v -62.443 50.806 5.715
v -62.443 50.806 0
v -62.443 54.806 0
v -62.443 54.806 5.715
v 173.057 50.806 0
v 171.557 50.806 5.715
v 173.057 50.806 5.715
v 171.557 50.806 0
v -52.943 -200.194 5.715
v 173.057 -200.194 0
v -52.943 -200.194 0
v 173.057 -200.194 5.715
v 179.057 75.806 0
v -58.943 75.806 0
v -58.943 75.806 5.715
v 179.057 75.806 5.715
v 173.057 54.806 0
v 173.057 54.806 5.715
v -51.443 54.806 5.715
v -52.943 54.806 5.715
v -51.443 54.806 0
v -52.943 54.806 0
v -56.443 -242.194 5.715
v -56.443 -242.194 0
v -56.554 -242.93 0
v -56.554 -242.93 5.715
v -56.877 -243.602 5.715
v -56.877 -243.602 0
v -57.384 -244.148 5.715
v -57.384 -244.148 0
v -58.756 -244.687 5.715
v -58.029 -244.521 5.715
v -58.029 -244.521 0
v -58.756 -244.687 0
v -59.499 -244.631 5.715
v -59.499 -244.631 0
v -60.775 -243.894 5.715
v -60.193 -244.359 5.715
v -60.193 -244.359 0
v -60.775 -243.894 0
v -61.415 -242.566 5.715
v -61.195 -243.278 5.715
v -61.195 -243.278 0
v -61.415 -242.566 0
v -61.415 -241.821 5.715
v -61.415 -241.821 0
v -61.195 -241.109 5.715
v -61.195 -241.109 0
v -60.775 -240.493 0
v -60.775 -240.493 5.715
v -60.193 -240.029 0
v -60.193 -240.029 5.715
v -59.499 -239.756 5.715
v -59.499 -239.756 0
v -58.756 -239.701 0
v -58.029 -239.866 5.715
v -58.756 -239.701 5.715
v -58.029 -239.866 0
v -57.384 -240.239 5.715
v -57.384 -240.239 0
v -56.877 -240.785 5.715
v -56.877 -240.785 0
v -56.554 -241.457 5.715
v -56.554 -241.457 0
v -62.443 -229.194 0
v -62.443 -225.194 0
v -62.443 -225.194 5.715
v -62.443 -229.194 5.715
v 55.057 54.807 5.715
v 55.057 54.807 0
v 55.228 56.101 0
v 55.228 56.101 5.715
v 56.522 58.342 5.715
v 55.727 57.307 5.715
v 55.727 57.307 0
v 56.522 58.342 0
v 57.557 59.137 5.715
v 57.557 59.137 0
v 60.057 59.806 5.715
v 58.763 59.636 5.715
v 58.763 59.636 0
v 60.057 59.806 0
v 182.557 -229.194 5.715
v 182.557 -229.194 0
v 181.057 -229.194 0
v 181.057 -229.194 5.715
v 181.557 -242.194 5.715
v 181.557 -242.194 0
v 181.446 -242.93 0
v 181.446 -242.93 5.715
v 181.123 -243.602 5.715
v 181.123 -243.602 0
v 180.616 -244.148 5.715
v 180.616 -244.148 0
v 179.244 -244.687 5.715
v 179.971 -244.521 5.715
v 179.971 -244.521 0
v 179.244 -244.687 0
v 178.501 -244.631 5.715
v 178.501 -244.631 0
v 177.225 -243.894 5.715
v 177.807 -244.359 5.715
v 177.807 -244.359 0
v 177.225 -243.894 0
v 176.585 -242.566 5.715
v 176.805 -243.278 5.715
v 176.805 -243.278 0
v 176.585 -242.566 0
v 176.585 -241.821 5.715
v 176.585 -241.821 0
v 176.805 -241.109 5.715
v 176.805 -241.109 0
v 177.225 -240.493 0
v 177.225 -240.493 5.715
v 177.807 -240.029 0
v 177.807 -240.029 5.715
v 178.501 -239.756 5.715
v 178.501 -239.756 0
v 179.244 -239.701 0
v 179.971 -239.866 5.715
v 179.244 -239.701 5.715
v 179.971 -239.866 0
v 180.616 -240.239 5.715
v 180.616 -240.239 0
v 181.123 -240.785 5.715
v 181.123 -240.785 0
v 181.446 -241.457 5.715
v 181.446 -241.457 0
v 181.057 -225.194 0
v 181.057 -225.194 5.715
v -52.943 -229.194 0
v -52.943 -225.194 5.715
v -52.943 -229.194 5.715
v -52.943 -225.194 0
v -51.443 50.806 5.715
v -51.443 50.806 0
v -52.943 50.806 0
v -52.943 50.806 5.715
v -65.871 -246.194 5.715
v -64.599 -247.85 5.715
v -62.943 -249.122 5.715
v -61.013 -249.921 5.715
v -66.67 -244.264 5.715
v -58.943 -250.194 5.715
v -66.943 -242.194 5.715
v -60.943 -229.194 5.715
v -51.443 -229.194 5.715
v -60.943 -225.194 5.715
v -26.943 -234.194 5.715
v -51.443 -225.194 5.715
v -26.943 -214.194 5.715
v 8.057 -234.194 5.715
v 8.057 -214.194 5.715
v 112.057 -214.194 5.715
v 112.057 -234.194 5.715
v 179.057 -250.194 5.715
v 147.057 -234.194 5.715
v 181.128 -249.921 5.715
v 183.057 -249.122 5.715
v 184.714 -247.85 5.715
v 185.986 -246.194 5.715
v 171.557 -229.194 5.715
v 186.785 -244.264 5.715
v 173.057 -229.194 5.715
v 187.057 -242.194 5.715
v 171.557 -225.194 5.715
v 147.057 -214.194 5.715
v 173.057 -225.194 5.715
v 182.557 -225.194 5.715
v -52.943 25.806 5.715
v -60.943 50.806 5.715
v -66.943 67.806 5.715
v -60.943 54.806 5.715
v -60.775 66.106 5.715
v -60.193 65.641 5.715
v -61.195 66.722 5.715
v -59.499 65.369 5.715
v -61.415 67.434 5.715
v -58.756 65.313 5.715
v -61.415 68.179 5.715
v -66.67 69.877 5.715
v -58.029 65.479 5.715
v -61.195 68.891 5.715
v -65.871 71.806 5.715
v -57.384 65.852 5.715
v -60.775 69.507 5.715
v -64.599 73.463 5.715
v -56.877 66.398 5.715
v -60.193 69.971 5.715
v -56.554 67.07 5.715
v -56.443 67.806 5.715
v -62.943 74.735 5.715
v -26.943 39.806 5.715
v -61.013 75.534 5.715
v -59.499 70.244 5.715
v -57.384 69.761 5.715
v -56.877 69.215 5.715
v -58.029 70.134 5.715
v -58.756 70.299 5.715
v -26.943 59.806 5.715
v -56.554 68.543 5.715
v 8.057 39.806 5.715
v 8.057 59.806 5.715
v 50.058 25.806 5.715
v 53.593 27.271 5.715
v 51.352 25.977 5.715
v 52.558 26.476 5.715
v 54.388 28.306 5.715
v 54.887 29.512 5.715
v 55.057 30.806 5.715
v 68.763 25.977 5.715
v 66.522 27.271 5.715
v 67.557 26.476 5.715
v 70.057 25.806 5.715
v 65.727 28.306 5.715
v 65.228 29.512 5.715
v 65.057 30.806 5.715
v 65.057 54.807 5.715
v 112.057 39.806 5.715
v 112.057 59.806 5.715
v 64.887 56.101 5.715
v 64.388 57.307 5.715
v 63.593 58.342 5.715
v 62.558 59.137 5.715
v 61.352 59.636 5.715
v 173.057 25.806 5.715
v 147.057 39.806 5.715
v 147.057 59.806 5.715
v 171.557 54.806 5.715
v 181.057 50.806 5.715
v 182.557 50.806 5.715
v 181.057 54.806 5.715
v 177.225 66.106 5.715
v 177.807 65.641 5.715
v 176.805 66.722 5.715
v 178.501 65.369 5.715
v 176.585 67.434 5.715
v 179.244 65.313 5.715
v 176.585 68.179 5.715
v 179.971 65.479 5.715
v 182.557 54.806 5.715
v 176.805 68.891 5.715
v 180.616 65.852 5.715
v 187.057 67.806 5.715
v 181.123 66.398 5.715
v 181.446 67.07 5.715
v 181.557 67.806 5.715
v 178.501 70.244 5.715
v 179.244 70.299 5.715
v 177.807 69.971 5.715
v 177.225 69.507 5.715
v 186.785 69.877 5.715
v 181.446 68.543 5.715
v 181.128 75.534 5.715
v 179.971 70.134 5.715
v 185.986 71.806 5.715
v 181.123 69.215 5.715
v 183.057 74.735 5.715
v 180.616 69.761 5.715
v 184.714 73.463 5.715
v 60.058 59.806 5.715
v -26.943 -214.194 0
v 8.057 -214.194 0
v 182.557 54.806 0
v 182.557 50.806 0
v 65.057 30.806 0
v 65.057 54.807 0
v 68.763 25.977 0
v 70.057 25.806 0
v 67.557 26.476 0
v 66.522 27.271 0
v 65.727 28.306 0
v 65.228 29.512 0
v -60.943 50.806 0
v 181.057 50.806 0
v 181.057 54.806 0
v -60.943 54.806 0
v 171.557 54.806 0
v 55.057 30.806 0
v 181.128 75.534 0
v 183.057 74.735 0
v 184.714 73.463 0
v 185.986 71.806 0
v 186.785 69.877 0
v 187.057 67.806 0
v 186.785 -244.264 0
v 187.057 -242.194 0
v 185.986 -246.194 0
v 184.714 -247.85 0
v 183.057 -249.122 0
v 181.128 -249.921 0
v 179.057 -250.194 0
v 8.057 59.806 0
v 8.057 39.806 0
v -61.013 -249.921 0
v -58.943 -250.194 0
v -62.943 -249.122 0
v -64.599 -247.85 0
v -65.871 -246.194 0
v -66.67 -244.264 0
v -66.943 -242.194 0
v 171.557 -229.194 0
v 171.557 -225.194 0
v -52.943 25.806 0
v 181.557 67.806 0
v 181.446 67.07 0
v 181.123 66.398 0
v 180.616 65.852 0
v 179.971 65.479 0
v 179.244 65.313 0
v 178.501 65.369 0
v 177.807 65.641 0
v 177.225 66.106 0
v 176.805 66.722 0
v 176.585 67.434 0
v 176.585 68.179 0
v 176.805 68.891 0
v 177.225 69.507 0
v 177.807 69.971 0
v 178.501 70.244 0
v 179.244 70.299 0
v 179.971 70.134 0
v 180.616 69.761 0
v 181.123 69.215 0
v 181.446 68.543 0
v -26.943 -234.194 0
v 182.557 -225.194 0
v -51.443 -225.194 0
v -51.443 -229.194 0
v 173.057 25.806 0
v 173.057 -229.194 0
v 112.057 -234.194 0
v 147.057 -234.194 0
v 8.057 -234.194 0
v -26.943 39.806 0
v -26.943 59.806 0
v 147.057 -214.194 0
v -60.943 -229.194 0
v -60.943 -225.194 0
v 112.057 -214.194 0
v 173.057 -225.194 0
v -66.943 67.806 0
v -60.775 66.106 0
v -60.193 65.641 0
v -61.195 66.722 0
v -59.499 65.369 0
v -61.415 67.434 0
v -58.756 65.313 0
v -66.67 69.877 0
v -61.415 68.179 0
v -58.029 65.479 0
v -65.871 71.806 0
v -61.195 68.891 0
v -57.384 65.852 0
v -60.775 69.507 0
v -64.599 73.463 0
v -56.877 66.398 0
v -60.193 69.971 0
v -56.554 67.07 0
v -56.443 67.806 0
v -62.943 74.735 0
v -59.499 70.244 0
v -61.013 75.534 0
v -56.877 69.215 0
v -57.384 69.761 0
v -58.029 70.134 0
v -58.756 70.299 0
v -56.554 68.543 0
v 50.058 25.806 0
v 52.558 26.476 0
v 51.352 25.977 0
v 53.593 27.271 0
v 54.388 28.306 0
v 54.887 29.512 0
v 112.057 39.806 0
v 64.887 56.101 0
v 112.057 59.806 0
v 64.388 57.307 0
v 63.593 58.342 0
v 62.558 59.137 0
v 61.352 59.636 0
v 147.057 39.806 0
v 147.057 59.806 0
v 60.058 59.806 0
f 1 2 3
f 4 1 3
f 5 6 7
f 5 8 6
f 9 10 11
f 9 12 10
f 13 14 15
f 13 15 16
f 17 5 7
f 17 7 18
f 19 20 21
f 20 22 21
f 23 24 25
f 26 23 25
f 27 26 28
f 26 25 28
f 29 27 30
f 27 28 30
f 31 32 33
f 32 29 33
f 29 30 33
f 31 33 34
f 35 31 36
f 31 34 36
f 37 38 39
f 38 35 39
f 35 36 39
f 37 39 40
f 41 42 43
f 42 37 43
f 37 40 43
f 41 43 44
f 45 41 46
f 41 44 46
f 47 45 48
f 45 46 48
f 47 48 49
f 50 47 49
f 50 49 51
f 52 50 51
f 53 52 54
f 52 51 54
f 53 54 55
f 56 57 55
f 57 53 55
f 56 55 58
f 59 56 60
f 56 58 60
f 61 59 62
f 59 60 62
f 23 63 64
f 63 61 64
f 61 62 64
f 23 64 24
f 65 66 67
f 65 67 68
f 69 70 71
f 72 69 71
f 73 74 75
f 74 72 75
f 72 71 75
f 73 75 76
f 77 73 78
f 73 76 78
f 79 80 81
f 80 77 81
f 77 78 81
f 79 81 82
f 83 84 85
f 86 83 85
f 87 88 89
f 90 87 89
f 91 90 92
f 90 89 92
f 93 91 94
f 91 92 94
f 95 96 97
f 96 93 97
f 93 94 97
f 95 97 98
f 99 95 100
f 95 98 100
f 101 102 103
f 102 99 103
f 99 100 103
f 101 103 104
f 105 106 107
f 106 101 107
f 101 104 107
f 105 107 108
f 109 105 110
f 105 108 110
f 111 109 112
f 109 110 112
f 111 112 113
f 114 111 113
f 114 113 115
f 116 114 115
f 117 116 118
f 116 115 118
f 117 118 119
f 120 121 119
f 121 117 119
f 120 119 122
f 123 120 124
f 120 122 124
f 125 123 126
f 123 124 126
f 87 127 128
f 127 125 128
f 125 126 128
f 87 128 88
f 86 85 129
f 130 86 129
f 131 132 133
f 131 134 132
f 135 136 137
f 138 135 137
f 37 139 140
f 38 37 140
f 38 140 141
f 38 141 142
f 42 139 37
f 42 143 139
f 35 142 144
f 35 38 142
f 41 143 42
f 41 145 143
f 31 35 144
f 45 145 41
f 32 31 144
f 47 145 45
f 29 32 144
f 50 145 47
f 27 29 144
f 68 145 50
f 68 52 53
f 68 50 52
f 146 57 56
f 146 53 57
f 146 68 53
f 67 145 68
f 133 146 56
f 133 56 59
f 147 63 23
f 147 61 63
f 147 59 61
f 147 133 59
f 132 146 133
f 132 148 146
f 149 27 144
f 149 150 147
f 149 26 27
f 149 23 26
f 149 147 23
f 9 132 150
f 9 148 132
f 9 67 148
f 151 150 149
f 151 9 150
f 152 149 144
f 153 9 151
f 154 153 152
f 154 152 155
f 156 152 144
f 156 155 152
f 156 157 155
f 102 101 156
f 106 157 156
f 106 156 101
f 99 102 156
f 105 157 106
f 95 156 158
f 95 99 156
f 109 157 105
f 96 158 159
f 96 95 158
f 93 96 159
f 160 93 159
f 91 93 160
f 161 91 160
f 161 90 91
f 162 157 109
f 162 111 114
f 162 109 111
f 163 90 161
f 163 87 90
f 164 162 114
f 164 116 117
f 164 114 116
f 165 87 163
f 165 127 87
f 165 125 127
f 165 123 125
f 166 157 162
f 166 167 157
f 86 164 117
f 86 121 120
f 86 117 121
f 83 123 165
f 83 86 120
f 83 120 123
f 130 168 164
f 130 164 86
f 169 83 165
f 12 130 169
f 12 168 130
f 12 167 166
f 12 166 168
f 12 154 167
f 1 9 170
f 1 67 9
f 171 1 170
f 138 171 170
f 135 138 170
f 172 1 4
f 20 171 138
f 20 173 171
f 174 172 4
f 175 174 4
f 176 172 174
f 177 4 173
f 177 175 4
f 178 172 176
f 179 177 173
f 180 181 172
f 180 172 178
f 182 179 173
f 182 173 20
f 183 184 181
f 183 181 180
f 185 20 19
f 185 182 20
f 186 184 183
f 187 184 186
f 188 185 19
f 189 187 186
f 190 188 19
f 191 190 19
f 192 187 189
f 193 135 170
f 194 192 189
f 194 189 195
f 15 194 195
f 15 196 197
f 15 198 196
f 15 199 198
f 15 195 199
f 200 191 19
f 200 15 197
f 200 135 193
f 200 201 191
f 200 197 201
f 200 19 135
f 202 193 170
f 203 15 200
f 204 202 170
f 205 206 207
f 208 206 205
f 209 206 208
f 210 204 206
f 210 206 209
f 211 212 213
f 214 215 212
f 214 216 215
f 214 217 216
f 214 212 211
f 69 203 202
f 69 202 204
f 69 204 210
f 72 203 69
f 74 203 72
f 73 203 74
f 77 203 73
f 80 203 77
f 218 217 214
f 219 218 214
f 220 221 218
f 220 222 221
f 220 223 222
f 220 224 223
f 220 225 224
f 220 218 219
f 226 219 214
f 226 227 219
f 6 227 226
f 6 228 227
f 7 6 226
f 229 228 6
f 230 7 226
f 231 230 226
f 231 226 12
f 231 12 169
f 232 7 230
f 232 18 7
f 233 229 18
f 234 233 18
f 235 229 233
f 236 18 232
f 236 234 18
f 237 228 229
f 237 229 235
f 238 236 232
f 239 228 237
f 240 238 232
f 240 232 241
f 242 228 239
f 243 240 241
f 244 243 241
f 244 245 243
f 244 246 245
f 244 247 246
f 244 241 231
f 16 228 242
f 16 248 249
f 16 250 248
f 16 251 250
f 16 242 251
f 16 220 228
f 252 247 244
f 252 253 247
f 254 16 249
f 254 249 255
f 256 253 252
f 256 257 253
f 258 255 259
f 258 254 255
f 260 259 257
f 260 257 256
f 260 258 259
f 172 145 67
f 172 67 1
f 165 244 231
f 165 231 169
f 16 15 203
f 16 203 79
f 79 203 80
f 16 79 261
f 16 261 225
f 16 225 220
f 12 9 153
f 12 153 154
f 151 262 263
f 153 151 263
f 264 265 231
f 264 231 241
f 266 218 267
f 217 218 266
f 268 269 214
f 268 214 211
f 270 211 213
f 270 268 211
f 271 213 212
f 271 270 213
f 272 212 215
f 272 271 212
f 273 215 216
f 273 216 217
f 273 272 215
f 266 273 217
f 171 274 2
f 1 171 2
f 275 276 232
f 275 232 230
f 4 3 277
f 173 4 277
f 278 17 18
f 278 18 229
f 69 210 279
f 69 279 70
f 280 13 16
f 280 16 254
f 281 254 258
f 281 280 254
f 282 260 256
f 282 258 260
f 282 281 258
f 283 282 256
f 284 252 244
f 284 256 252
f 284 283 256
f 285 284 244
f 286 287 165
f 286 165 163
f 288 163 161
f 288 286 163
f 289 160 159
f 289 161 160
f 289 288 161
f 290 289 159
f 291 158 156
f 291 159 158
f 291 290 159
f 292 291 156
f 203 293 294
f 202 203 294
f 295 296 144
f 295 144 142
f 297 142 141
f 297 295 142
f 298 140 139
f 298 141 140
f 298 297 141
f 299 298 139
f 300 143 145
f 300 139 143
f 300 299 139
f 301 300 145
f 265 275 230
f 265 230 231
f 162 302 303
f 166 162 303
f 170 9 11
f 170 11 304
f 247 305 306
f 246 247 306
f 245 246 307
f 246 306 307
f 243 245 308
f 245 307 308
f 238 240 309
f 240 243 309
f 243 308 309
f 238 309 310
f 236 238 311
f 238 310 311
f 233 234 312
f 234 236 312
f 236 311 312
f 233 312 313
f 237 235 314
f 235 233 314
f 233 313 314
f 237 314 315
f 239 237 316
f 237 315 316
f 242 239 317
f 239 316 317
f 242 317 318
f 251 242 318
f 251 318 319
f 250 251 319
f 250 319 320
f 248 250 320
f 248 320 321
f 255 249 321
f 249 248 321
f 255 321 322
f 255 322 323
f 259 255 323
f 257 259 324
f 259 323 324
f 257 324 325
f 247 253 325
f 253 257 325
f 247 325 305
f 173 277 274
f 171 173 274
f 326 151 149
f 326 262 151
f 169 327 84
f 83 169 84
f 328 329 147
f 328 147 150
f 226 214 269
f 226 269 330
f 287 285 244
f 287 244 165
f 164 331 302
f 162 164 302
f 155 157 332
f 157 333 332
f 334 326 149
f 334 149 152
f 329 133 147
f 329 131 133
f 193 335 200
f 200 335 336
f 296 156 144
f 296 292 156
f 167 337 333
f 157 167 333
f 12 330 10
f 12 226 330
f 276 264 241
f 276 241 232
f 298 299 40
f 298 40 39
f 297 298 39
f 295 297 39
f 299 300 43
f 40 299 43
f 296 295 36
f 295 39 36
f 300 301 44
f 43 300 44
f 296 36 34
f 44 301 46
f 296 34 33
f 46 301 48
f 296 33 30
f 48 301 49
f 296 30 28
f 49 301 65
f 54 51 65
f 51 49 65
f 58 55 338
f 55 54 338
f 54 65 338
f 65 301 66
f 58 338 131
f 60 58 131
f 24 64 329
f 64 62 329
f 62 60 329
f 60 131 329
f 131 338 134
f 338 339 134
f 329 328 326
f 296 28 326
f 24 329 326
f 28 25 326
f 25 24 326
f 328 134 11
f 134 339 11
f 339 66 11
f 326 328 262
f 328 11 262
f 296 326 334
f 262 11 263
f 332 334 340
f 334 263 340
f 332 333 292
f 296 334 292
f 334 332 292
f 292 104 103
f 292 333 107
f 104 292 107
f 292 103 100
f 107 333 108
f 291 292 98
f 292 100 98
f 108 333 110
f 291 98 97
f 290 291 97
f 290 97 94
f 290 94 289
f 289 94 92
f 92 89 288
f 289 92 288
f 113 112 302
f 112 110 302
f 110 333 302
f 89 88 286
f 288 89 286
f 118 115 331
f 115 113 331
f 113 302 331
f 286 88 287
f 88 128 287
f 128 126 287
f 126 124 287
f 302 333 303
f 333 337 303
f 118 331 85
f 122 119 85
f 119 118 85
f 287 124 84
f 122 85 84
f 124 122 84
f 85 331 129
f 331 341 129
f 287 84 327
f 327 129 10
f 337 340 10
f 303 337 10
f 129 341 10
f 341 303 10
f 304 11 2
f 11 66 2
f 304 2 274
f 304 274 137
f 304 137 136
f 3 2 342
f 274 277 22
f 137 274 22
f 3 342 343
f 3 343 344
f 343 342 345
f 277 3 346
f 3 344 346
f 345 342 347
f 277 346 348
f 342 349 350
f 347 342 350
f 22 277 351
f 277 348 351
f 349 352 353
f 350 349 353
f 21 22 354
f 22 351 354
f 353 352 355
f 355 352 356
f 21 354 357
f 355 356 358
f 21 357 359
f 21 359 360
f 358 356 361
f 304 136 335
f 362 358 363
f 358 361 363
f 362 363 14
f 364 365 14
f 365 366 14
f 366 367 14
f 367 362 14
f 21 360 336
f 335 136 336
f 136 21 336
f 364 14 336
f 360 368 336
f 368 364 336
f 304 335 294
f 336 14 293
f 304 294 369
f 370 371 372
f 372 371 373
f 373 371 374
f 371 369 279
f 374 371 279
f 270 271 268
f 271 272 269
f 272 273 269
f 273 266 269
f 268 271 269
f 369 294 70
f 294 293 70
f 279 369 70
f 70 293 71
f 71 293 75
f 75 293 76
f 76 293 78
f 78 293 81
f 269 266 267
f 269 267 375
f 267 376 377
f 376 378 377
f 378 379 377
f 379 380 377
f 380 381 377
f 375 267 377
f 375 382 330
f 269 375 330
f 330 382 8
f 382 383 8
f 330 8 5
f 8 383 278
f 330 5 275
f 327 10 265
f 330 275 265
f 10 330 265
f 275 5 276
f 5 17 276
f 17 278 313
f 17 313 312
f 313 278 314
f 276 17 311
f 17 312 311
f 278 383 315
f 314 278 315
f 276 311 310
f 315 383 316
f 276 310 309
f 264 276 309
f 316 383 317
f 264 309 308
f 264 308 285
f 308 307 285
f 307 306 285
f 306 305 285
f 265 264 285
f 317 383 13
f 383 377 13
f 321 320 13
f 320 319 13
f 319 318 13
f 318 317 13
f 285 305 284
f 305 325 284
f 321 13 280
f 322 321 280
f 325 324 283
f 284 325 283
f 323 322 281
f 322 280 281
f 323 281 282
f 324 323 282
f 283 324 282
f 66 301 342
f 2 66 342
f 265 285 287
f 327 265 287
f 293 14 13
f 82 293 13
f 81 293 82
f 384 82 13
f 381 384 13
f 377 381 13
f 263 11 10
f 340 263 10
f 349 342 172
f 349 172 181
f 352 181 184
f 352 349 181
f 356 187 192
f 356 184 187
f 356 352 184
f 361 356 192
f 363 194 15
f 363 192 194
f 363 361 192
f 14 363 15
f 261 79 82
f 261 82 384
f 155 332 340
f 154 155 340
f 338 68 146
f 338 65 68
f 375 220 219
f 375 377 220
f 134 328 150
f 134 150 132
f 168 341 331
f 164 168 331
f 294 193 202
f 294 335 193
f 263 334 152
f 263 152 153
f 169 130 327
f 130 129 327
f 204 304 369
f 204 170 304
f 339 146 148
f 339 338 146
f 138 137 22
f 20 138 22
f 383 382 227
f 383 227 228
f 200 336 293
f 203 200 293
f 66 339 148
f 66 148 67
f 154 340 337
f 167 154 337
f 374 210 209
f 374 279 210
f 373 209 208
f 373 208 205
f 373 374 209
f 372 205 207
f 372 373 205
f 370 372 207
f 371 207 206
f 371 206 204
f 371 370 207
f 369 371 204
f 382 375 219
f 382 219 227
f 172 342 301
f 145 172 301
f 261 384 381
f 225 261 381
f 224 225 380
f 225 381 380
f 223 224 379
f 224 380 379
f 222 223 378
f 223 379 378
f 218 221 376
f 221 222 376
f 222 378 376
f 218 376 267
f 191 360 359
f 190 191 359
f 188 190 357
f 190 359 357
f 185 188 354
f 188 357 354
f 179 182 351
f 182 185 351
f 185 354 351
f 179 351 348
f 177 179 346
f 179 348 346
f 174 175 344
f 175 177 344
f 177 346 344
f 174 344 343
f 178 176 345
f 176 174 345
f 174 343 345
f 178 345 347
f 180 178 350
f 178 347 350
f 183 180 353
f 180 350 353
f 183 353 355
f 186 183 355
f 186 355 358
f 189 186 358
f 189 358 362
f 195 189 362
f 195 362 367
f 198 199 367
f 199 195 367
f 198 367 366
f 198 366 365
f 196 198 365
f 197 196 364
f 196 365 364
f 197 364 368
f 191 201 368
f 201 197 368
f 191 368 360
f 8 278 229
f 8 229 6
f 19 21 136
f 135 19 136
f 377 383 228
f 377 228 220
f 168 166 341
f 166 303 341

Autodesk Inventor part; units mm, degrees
ref_plane "YZ Plane" through (0, 0, 0) normal (1, 0, 0) x (0, 1, 0)
ref_plane "XZ Plane" through (0, 0, 0) normal (0, 1, 0) x (-1, 0, 0)
ref_plane "XY Plane" through (0, 0, 0) normal (0, 0, 1) x (1, 0, 0)
sketch "Sketch3" plane through (0, 0, 0) normal (0, 0, 1) x (1, 0, 0)
  line L0 (181.0574, -229.1936) -> (181.0574, -225.1936) projected
  line L1 (181.0574, -225.1936) -> (182.5574, -225.1936) projected
  line L2 (182.5574, -225.1936) -> (182.5574, -229.1936) projected
  line L3 (182.5574, -229.1936) -> (181.0574, -229.1936) projected
  line L4 (171.5574, -229.1936) -> (171.5574, -225.1936) projected
  line L5 (171.5574, -225.1936) -> (173.0574, -225.1936) projected
  line L6 (173.0574, -225.1936) -> (173.0574, -229.1936) projected
  line L7 (173.0574, -229.1936) -> (171.5574, -229.1936) projected
  circle A0 centre (179.0574, -242.1936) radius 2.5 projected
  line L8 (112.0574, -234.1936) -> (112.0574, -194.1936) projected
  line L9 (112.0574, -194.1936) -> (147.0574, -194.1936) projected
  line L10 (147.0574, -194.1936) -> (147.0574, -234.1936) projected
  line L11 (147.0574, -234.1936) -> (112.0574, -234.1936) projected
  line L12 (181.0574, 54.8064) -> (181.0574, 50.8064) projected
  line L13 (182.5574, 54.8064) -> (181.0574, 54.8064) projected
  line L14 (182.5574, 50.8064) -> (182.5574, 54.8064) projected
  line L15 (181.0574, 50.8064) -> (182.5574, 50.8064) projected
  line L16 (171.5574, 54.8064) -> (171.5574, 50.8064) projected
  line L17 (173.0574, 54.8064) -> (171.5574, 54.8064) projected
  line L18 (173.0574, 50.8064) -> (173.0574, 54.8064) projected
  line L19 (171.5574, 50.8064) -> (173.0574, 50.8064) projected
  circle A1 centre (179.0574, 67.8064) radius 2.5 projected
  line L20 (112.0574, 59.8064) -> (112.0574, 19.8064) projected
  line L21 (147.0574, 59.8064) -> (112.0574, 59.8064) projected
  line L22 (147.0574, 19.8064) -> (147.0574, 59.8064) projected
  line L23 (112.0574, 19.8064) -> (147.0574, 19.8064) projected
  line L24 (-60.9426, -229.1936) -> (-60.9426, -225.1936) projected
  line L25 (-62.4426, -229.1936) -> (-60.9426, -229.1936) projected
  line L26 (-62.4426, -225.1936) -> (-62.4426, -229.1936) projected
  line L27 (-60.9426, -225.1936) -> (-62.4426, -225.1936) projected
  line L28 (-51.4426, -229.1936) -> (-51.4426, -225.1936) projected
  line L29 (-52.9426, -229.1936) -> (-51.4426, -229.1936) projected
  line L30 (-52.9426, -225.1936) -> (-52.9426, -229.1936) projected
  line L31 (-51.4426, -225.1936) -> (-52.9426, -225.1936) projected
  circle A2 centre (-58.9426, -242.1936) radius 2.5 projected
  line L32 (8.0574, -234.1936) -> (8.0574, -194.1936) projected
  line L33 (-26.9426, -234.1936) -> (8.0574, -234.1936) projected
  line L34 (-26.9426, -194.1936) -> (-26.9426, -234.1936) projected
  line L35 (8.0574, -194.1936) -> (-26.9426, -194.1936) projected
  arc A3 (-66.9426, 49.8064) -> (-64.9426, 47.8064) centre (-64.9426, 49.8064) ccw projected
  line L36 (-64.9426, 47.8064) -> (-58.9426, 47.8064) projected
  line L37 (-58.9426, 47.8064) -> (-58.9426, 57.8064) projected
  line L38 (-58.9426, 57.8064) -> (-54.9426, 57.8064) projected
  line L39 (-54.9426, 57.8064) -> (-54.9426, 47.8064) projected
  line L40 (-54.9426, 47.8064) -> (-48.9426, 47.8064) projected
  arc A4 (-46.9426, 45.8064) -> (-48.9426, 47.8064) centre (-48.9426, 45.8064) ccw projected
  line L41 (-46.9426, 45.8064) -> (-46.9426, -220.1936) projected
  arc A5 (-48.9426, -222.1936) -> (-46.9426, -220.1936) centre (-48.9426, -220.1936) ccw projected
  line L42 (-54.9426, -222.1936) -> (-48.9426, -222.1936) projected
  line L43 (-54.9426, -232.1936) -> (-54.9426, -222.1936) projected
  line L44 (-58.9426, -232.1936) -> (-54.9426, -232.1936) projected
  line L45 (-58.9426, -222.1936) -> (-58.9426, -232.1936) projected
  line L46 (-64.9426, -222.1936) -> (-58.9426, -222.1936) projected
  arc A6 (-64.9426, -222.1936) -> (-66.9426, -224.1936) centre (-64.9426, -224.1936) ccw projected
  line L47 (-66.9426, -242.1936) -> (-66.9426, -224.1936) projected
  arc A7 (-66.9426, -242.1936) -> (-58.9426, -250.1936) centre (-58.9426, -242.1936) ccw projected
  line L48 (179.0574, -250.1936) -> (-58.9426, -250.1936) projected
  arc A8 (179.0574, -250.1936) -> (187.0574, -242.1936) centre (179.0574, -242.1936) ccw projected
  line L49 (187.0574, -242.1936) -> (187.0574, -224.1936) projected
  arc A9 (187.0574, -224.1936) -> (185.0574, -222.1936) centre (185.0574, -224.1936) ccw projected
  line L50 (185.0574, -222.1936) -> (179.0574, -222.1936) projected
  line L51 (179.0574, -222.1936) -> (179.0574, -232.1936) projected
  line L52 (179.0574, -232.1936) -> (175.0574, -232.1936) projected
  line L53 (175.0574, -232.1936) -> (175.0574, -222.1936) projected
  line L54 (175.0574, -222.1936) -> (169.0574, -222.1936) projected
  arc A10 (167.0574, -220.1936) -> (169.0574, -222.1936) centre (169.0574, -220.1936) ccw projected
  line L55 (167.0574, -220.1936) -> (167.0574, 45.8064) projected
  arc A11 (169.0574, 47.8064) -> (167.0574, 45.8064) centre (169.0574, 45.8064) ccw projected
  line L56 (175.0574, 47.8064) -> (169.0574, 47.8064) projected
  line L57 (175.0574, 57.8064) -> (175.0574, 47.8064) projected
  line L58 (179.0574, 57.8064) -> (175.0574, 57.8064) projected
  line L59 (179.0574, 47.8064) -> (179.0574, 57.8064) projected
  line L60 (185.0574, 47.8064) -> (179.0574, 47.8064) projected
  arc A12 (185.0574, 47.8064) -> (187.0574, 49.8064) centre (185.0574, 49.8064) ccw projected
  line L61 (187.0574, 67.8064) -> (187.0574, 49.8064) projected
  arc A13 (187.0574, 67.8064) -> (179.0574, 75.8064) centre (179.0574, 67.8064) ccw projected
  line L62 (-58.9426, 75.8064) -> (179.0574, 75.8064) projected
  arc A14 (-58.9426, 75.8064) -> (-66.9426, 67.8064) centre (-58.9426, 67.8064) ccw projected
  line L63 (-66.9426, 67.8064) -> (-66.9426, 49.8064) projected
  line L64 (8.0574, 59.8064) -> (8.0574, 19.8064) projected
  line L65 (8.0574, 19.8064) -> (-26.9426, 19.8064) projected
  line L66 (-26.9426, 19.8064) -> (-26.9426, 59.8064) projected
  line L67 (-26.9426, 59.8064) -> (8.0574, 59.8064) projected
  circle A15 centre (-58.9426, 67.8064) radius 2.5 projected
  line L68 (-51.4426, 54.8064) -> (-51.4426, 50.8064) projected
  line L69 (-51.4426, 50.8064) -> (-52.9426, 50.8064) projected
  line L70 (-52.9426, 50.8064) -> (-52.9426, 54.8064) projected
  line L71 (-52.9426, 54.8064) -> (-51.4426, 54.8064) projected
  line L72 (-60.9426, 54.8064) -> (-60.9426, 50.8064) projected
  line L73 (-60.9426, 50.8064) -> (-62.4426, 50.8064) projected
  line L74 (-62.4426, 50.8064) -> (-62.4426, 54.8064) projected
  line L75 (-62.4426, 54.8064) -> (-60.9426, 54.8064) projected
  line L76 (-66.9426, 49.8064) -> (-66.9426, -224.1936)
  line L77 (187.0574, -224.1936) -> (187.0574, 49.8064)
  line L78 (-26.9426, 39.8064) -> (8.0574, 39.8064)
  line L79 (112.0574, 39.8064) -> (147.0574, 39.8064)
  line L80 (-26.9426, -214.1936) -> (8.0574, -214.1936)
  line L81 (112.0574, -214.1936) -> (147.0574, -214.1936)
  line L82 (65.0574, 54.8064) -> (65.0574, 30.8064) projected
  arc A16 (65.0574, 30.8064) -> (70.0574, 25.8064) centre (70.0574, 30.8064) ccw projected
  line L83 (70.0574, 25.8064) -> (72.5574, 25.8064) projected
  line L84 (72.5574, 25.8064) -> (72.5574, 13.3064) projected
  arc A17 (47.5574, 13.3064) -> (72.5574, 13.3064) centre (60.0574, 13.3064) ccw projected
  line L85 (47.5574, 13.3064) -> (47.5574, 25.8064) projected
  line L86 (47.5574, 25.8064) -> (50.0574, 25.8064) projected
  arc A18 (50.0574, 25.8064) -> (55.0574, 30.8064) centre (50.0574, 30.8064) ccw projected
  line L87 (55.0574, 30.8064) -> (55.0574, 54.8064) projected
  arc A19 (65.0574, 54.8064) -> (55.0574, 54.8064) centre (60.0574, 54.8064) ccw projected
  point P0 (0, 0)
extrude "Extrusion3" add sketch "Sketch3" along normal blind 5.715 contours L8 L9 L10 L81 | L79 L22 L23 L20 | L80 L34 L35 L32 | L63 A14 L62 A13 L61 A12 L60 L59 L58 L57 L56 A11 L55 A10 L54 L53 L52 L51 L50 A9 L49 A8 L48 A7 L47 A6 L46 L45 L44 L43 L42 A5 L41 A4 L40 L39 L38 L37 L36 A3 | A3 L36 L37 L38 L39 L40 A4 L41 A5 L42 L43 L44 L45 L46 A6 L76 | L77 A9 L50 L51 L52 L53 L54 A10 L55 A11 L56 L57 L58 L59 L60 A12 | L64 L65 L66 L78 | L82 A16 L83 L84 A17 L85 L86 A18 L87 A19
sketch "Sketch4" plane through (0, 0, 5.715) normal (0, 0, 1) x (1, 0, 0)
  line L0 (187.0574, -242.1936) -> (187.0574, 67.8064) projected
  line L1 (179.0574, 75.8064) -> (-58.9426, 75.8064) projected
  line L2 (-52.9426, 25.8064) -> (173.0574, 25.8064)
  line L3 (173.0574, 25.8064) -> (173.0574, -200.1936)
  line L4 (173.0574, -200.1936) -> (-52.9426, -200.1936)
  line L5 (-52.9426, -200.1936) -> (-52.9426, 25.8064)
  point P0 (0, 0)
  point P1 (60.0574, 25.8064)
  point P2 (60.0574, 75.8064)
  point P3 (173.0574, -87.1936)
  point P4 (187.0574, -87.1936)
  dimension "d8" = 226
extrude "Extrusion4" cut sketch "Sketch4" against normal through all
sketch "Sketch5" plane through (0, 0, 5.715) normal (0, 0, 1) x (1, 0, 0)
  line L0 (-52.9426, 25.8064) -> (173.0574, 25.8064) projected
  line L1 (147.0574, 39.8064) -> (112.0574, 39.8064) projected
  line L2 (179.0574, 75.8064) -> (-58.9426, 75.8064) projected
  line L3 (55.0574, 25.8064) -> (55.0574, 59.8064)
  line L4 (55.0574, 59.8064) -> (65.0574, 59.8064)
  line L5 (65.0574, 59.8064) -> (65.0574, 25.8064)
  point P0 (0, 0)
  point P1 (60.0574, 59.8064)
  point P2 (60.0574, 25.8064)
  dimension "d12" = 10
  dimension "d15" = 20
extrude "Extrusion5" cut sketch "Sketch5" against normal through all
fillet "Fillet1" radius 5 4 edges at (55.0574, 25.8064, 2.8575) (55.0574, 59.8064, 2.8575) (65.0574, 59.8064, 2.8575) (65.0574, 25.8064, 2.8575)
properties part number "BED PLATE TOP"
